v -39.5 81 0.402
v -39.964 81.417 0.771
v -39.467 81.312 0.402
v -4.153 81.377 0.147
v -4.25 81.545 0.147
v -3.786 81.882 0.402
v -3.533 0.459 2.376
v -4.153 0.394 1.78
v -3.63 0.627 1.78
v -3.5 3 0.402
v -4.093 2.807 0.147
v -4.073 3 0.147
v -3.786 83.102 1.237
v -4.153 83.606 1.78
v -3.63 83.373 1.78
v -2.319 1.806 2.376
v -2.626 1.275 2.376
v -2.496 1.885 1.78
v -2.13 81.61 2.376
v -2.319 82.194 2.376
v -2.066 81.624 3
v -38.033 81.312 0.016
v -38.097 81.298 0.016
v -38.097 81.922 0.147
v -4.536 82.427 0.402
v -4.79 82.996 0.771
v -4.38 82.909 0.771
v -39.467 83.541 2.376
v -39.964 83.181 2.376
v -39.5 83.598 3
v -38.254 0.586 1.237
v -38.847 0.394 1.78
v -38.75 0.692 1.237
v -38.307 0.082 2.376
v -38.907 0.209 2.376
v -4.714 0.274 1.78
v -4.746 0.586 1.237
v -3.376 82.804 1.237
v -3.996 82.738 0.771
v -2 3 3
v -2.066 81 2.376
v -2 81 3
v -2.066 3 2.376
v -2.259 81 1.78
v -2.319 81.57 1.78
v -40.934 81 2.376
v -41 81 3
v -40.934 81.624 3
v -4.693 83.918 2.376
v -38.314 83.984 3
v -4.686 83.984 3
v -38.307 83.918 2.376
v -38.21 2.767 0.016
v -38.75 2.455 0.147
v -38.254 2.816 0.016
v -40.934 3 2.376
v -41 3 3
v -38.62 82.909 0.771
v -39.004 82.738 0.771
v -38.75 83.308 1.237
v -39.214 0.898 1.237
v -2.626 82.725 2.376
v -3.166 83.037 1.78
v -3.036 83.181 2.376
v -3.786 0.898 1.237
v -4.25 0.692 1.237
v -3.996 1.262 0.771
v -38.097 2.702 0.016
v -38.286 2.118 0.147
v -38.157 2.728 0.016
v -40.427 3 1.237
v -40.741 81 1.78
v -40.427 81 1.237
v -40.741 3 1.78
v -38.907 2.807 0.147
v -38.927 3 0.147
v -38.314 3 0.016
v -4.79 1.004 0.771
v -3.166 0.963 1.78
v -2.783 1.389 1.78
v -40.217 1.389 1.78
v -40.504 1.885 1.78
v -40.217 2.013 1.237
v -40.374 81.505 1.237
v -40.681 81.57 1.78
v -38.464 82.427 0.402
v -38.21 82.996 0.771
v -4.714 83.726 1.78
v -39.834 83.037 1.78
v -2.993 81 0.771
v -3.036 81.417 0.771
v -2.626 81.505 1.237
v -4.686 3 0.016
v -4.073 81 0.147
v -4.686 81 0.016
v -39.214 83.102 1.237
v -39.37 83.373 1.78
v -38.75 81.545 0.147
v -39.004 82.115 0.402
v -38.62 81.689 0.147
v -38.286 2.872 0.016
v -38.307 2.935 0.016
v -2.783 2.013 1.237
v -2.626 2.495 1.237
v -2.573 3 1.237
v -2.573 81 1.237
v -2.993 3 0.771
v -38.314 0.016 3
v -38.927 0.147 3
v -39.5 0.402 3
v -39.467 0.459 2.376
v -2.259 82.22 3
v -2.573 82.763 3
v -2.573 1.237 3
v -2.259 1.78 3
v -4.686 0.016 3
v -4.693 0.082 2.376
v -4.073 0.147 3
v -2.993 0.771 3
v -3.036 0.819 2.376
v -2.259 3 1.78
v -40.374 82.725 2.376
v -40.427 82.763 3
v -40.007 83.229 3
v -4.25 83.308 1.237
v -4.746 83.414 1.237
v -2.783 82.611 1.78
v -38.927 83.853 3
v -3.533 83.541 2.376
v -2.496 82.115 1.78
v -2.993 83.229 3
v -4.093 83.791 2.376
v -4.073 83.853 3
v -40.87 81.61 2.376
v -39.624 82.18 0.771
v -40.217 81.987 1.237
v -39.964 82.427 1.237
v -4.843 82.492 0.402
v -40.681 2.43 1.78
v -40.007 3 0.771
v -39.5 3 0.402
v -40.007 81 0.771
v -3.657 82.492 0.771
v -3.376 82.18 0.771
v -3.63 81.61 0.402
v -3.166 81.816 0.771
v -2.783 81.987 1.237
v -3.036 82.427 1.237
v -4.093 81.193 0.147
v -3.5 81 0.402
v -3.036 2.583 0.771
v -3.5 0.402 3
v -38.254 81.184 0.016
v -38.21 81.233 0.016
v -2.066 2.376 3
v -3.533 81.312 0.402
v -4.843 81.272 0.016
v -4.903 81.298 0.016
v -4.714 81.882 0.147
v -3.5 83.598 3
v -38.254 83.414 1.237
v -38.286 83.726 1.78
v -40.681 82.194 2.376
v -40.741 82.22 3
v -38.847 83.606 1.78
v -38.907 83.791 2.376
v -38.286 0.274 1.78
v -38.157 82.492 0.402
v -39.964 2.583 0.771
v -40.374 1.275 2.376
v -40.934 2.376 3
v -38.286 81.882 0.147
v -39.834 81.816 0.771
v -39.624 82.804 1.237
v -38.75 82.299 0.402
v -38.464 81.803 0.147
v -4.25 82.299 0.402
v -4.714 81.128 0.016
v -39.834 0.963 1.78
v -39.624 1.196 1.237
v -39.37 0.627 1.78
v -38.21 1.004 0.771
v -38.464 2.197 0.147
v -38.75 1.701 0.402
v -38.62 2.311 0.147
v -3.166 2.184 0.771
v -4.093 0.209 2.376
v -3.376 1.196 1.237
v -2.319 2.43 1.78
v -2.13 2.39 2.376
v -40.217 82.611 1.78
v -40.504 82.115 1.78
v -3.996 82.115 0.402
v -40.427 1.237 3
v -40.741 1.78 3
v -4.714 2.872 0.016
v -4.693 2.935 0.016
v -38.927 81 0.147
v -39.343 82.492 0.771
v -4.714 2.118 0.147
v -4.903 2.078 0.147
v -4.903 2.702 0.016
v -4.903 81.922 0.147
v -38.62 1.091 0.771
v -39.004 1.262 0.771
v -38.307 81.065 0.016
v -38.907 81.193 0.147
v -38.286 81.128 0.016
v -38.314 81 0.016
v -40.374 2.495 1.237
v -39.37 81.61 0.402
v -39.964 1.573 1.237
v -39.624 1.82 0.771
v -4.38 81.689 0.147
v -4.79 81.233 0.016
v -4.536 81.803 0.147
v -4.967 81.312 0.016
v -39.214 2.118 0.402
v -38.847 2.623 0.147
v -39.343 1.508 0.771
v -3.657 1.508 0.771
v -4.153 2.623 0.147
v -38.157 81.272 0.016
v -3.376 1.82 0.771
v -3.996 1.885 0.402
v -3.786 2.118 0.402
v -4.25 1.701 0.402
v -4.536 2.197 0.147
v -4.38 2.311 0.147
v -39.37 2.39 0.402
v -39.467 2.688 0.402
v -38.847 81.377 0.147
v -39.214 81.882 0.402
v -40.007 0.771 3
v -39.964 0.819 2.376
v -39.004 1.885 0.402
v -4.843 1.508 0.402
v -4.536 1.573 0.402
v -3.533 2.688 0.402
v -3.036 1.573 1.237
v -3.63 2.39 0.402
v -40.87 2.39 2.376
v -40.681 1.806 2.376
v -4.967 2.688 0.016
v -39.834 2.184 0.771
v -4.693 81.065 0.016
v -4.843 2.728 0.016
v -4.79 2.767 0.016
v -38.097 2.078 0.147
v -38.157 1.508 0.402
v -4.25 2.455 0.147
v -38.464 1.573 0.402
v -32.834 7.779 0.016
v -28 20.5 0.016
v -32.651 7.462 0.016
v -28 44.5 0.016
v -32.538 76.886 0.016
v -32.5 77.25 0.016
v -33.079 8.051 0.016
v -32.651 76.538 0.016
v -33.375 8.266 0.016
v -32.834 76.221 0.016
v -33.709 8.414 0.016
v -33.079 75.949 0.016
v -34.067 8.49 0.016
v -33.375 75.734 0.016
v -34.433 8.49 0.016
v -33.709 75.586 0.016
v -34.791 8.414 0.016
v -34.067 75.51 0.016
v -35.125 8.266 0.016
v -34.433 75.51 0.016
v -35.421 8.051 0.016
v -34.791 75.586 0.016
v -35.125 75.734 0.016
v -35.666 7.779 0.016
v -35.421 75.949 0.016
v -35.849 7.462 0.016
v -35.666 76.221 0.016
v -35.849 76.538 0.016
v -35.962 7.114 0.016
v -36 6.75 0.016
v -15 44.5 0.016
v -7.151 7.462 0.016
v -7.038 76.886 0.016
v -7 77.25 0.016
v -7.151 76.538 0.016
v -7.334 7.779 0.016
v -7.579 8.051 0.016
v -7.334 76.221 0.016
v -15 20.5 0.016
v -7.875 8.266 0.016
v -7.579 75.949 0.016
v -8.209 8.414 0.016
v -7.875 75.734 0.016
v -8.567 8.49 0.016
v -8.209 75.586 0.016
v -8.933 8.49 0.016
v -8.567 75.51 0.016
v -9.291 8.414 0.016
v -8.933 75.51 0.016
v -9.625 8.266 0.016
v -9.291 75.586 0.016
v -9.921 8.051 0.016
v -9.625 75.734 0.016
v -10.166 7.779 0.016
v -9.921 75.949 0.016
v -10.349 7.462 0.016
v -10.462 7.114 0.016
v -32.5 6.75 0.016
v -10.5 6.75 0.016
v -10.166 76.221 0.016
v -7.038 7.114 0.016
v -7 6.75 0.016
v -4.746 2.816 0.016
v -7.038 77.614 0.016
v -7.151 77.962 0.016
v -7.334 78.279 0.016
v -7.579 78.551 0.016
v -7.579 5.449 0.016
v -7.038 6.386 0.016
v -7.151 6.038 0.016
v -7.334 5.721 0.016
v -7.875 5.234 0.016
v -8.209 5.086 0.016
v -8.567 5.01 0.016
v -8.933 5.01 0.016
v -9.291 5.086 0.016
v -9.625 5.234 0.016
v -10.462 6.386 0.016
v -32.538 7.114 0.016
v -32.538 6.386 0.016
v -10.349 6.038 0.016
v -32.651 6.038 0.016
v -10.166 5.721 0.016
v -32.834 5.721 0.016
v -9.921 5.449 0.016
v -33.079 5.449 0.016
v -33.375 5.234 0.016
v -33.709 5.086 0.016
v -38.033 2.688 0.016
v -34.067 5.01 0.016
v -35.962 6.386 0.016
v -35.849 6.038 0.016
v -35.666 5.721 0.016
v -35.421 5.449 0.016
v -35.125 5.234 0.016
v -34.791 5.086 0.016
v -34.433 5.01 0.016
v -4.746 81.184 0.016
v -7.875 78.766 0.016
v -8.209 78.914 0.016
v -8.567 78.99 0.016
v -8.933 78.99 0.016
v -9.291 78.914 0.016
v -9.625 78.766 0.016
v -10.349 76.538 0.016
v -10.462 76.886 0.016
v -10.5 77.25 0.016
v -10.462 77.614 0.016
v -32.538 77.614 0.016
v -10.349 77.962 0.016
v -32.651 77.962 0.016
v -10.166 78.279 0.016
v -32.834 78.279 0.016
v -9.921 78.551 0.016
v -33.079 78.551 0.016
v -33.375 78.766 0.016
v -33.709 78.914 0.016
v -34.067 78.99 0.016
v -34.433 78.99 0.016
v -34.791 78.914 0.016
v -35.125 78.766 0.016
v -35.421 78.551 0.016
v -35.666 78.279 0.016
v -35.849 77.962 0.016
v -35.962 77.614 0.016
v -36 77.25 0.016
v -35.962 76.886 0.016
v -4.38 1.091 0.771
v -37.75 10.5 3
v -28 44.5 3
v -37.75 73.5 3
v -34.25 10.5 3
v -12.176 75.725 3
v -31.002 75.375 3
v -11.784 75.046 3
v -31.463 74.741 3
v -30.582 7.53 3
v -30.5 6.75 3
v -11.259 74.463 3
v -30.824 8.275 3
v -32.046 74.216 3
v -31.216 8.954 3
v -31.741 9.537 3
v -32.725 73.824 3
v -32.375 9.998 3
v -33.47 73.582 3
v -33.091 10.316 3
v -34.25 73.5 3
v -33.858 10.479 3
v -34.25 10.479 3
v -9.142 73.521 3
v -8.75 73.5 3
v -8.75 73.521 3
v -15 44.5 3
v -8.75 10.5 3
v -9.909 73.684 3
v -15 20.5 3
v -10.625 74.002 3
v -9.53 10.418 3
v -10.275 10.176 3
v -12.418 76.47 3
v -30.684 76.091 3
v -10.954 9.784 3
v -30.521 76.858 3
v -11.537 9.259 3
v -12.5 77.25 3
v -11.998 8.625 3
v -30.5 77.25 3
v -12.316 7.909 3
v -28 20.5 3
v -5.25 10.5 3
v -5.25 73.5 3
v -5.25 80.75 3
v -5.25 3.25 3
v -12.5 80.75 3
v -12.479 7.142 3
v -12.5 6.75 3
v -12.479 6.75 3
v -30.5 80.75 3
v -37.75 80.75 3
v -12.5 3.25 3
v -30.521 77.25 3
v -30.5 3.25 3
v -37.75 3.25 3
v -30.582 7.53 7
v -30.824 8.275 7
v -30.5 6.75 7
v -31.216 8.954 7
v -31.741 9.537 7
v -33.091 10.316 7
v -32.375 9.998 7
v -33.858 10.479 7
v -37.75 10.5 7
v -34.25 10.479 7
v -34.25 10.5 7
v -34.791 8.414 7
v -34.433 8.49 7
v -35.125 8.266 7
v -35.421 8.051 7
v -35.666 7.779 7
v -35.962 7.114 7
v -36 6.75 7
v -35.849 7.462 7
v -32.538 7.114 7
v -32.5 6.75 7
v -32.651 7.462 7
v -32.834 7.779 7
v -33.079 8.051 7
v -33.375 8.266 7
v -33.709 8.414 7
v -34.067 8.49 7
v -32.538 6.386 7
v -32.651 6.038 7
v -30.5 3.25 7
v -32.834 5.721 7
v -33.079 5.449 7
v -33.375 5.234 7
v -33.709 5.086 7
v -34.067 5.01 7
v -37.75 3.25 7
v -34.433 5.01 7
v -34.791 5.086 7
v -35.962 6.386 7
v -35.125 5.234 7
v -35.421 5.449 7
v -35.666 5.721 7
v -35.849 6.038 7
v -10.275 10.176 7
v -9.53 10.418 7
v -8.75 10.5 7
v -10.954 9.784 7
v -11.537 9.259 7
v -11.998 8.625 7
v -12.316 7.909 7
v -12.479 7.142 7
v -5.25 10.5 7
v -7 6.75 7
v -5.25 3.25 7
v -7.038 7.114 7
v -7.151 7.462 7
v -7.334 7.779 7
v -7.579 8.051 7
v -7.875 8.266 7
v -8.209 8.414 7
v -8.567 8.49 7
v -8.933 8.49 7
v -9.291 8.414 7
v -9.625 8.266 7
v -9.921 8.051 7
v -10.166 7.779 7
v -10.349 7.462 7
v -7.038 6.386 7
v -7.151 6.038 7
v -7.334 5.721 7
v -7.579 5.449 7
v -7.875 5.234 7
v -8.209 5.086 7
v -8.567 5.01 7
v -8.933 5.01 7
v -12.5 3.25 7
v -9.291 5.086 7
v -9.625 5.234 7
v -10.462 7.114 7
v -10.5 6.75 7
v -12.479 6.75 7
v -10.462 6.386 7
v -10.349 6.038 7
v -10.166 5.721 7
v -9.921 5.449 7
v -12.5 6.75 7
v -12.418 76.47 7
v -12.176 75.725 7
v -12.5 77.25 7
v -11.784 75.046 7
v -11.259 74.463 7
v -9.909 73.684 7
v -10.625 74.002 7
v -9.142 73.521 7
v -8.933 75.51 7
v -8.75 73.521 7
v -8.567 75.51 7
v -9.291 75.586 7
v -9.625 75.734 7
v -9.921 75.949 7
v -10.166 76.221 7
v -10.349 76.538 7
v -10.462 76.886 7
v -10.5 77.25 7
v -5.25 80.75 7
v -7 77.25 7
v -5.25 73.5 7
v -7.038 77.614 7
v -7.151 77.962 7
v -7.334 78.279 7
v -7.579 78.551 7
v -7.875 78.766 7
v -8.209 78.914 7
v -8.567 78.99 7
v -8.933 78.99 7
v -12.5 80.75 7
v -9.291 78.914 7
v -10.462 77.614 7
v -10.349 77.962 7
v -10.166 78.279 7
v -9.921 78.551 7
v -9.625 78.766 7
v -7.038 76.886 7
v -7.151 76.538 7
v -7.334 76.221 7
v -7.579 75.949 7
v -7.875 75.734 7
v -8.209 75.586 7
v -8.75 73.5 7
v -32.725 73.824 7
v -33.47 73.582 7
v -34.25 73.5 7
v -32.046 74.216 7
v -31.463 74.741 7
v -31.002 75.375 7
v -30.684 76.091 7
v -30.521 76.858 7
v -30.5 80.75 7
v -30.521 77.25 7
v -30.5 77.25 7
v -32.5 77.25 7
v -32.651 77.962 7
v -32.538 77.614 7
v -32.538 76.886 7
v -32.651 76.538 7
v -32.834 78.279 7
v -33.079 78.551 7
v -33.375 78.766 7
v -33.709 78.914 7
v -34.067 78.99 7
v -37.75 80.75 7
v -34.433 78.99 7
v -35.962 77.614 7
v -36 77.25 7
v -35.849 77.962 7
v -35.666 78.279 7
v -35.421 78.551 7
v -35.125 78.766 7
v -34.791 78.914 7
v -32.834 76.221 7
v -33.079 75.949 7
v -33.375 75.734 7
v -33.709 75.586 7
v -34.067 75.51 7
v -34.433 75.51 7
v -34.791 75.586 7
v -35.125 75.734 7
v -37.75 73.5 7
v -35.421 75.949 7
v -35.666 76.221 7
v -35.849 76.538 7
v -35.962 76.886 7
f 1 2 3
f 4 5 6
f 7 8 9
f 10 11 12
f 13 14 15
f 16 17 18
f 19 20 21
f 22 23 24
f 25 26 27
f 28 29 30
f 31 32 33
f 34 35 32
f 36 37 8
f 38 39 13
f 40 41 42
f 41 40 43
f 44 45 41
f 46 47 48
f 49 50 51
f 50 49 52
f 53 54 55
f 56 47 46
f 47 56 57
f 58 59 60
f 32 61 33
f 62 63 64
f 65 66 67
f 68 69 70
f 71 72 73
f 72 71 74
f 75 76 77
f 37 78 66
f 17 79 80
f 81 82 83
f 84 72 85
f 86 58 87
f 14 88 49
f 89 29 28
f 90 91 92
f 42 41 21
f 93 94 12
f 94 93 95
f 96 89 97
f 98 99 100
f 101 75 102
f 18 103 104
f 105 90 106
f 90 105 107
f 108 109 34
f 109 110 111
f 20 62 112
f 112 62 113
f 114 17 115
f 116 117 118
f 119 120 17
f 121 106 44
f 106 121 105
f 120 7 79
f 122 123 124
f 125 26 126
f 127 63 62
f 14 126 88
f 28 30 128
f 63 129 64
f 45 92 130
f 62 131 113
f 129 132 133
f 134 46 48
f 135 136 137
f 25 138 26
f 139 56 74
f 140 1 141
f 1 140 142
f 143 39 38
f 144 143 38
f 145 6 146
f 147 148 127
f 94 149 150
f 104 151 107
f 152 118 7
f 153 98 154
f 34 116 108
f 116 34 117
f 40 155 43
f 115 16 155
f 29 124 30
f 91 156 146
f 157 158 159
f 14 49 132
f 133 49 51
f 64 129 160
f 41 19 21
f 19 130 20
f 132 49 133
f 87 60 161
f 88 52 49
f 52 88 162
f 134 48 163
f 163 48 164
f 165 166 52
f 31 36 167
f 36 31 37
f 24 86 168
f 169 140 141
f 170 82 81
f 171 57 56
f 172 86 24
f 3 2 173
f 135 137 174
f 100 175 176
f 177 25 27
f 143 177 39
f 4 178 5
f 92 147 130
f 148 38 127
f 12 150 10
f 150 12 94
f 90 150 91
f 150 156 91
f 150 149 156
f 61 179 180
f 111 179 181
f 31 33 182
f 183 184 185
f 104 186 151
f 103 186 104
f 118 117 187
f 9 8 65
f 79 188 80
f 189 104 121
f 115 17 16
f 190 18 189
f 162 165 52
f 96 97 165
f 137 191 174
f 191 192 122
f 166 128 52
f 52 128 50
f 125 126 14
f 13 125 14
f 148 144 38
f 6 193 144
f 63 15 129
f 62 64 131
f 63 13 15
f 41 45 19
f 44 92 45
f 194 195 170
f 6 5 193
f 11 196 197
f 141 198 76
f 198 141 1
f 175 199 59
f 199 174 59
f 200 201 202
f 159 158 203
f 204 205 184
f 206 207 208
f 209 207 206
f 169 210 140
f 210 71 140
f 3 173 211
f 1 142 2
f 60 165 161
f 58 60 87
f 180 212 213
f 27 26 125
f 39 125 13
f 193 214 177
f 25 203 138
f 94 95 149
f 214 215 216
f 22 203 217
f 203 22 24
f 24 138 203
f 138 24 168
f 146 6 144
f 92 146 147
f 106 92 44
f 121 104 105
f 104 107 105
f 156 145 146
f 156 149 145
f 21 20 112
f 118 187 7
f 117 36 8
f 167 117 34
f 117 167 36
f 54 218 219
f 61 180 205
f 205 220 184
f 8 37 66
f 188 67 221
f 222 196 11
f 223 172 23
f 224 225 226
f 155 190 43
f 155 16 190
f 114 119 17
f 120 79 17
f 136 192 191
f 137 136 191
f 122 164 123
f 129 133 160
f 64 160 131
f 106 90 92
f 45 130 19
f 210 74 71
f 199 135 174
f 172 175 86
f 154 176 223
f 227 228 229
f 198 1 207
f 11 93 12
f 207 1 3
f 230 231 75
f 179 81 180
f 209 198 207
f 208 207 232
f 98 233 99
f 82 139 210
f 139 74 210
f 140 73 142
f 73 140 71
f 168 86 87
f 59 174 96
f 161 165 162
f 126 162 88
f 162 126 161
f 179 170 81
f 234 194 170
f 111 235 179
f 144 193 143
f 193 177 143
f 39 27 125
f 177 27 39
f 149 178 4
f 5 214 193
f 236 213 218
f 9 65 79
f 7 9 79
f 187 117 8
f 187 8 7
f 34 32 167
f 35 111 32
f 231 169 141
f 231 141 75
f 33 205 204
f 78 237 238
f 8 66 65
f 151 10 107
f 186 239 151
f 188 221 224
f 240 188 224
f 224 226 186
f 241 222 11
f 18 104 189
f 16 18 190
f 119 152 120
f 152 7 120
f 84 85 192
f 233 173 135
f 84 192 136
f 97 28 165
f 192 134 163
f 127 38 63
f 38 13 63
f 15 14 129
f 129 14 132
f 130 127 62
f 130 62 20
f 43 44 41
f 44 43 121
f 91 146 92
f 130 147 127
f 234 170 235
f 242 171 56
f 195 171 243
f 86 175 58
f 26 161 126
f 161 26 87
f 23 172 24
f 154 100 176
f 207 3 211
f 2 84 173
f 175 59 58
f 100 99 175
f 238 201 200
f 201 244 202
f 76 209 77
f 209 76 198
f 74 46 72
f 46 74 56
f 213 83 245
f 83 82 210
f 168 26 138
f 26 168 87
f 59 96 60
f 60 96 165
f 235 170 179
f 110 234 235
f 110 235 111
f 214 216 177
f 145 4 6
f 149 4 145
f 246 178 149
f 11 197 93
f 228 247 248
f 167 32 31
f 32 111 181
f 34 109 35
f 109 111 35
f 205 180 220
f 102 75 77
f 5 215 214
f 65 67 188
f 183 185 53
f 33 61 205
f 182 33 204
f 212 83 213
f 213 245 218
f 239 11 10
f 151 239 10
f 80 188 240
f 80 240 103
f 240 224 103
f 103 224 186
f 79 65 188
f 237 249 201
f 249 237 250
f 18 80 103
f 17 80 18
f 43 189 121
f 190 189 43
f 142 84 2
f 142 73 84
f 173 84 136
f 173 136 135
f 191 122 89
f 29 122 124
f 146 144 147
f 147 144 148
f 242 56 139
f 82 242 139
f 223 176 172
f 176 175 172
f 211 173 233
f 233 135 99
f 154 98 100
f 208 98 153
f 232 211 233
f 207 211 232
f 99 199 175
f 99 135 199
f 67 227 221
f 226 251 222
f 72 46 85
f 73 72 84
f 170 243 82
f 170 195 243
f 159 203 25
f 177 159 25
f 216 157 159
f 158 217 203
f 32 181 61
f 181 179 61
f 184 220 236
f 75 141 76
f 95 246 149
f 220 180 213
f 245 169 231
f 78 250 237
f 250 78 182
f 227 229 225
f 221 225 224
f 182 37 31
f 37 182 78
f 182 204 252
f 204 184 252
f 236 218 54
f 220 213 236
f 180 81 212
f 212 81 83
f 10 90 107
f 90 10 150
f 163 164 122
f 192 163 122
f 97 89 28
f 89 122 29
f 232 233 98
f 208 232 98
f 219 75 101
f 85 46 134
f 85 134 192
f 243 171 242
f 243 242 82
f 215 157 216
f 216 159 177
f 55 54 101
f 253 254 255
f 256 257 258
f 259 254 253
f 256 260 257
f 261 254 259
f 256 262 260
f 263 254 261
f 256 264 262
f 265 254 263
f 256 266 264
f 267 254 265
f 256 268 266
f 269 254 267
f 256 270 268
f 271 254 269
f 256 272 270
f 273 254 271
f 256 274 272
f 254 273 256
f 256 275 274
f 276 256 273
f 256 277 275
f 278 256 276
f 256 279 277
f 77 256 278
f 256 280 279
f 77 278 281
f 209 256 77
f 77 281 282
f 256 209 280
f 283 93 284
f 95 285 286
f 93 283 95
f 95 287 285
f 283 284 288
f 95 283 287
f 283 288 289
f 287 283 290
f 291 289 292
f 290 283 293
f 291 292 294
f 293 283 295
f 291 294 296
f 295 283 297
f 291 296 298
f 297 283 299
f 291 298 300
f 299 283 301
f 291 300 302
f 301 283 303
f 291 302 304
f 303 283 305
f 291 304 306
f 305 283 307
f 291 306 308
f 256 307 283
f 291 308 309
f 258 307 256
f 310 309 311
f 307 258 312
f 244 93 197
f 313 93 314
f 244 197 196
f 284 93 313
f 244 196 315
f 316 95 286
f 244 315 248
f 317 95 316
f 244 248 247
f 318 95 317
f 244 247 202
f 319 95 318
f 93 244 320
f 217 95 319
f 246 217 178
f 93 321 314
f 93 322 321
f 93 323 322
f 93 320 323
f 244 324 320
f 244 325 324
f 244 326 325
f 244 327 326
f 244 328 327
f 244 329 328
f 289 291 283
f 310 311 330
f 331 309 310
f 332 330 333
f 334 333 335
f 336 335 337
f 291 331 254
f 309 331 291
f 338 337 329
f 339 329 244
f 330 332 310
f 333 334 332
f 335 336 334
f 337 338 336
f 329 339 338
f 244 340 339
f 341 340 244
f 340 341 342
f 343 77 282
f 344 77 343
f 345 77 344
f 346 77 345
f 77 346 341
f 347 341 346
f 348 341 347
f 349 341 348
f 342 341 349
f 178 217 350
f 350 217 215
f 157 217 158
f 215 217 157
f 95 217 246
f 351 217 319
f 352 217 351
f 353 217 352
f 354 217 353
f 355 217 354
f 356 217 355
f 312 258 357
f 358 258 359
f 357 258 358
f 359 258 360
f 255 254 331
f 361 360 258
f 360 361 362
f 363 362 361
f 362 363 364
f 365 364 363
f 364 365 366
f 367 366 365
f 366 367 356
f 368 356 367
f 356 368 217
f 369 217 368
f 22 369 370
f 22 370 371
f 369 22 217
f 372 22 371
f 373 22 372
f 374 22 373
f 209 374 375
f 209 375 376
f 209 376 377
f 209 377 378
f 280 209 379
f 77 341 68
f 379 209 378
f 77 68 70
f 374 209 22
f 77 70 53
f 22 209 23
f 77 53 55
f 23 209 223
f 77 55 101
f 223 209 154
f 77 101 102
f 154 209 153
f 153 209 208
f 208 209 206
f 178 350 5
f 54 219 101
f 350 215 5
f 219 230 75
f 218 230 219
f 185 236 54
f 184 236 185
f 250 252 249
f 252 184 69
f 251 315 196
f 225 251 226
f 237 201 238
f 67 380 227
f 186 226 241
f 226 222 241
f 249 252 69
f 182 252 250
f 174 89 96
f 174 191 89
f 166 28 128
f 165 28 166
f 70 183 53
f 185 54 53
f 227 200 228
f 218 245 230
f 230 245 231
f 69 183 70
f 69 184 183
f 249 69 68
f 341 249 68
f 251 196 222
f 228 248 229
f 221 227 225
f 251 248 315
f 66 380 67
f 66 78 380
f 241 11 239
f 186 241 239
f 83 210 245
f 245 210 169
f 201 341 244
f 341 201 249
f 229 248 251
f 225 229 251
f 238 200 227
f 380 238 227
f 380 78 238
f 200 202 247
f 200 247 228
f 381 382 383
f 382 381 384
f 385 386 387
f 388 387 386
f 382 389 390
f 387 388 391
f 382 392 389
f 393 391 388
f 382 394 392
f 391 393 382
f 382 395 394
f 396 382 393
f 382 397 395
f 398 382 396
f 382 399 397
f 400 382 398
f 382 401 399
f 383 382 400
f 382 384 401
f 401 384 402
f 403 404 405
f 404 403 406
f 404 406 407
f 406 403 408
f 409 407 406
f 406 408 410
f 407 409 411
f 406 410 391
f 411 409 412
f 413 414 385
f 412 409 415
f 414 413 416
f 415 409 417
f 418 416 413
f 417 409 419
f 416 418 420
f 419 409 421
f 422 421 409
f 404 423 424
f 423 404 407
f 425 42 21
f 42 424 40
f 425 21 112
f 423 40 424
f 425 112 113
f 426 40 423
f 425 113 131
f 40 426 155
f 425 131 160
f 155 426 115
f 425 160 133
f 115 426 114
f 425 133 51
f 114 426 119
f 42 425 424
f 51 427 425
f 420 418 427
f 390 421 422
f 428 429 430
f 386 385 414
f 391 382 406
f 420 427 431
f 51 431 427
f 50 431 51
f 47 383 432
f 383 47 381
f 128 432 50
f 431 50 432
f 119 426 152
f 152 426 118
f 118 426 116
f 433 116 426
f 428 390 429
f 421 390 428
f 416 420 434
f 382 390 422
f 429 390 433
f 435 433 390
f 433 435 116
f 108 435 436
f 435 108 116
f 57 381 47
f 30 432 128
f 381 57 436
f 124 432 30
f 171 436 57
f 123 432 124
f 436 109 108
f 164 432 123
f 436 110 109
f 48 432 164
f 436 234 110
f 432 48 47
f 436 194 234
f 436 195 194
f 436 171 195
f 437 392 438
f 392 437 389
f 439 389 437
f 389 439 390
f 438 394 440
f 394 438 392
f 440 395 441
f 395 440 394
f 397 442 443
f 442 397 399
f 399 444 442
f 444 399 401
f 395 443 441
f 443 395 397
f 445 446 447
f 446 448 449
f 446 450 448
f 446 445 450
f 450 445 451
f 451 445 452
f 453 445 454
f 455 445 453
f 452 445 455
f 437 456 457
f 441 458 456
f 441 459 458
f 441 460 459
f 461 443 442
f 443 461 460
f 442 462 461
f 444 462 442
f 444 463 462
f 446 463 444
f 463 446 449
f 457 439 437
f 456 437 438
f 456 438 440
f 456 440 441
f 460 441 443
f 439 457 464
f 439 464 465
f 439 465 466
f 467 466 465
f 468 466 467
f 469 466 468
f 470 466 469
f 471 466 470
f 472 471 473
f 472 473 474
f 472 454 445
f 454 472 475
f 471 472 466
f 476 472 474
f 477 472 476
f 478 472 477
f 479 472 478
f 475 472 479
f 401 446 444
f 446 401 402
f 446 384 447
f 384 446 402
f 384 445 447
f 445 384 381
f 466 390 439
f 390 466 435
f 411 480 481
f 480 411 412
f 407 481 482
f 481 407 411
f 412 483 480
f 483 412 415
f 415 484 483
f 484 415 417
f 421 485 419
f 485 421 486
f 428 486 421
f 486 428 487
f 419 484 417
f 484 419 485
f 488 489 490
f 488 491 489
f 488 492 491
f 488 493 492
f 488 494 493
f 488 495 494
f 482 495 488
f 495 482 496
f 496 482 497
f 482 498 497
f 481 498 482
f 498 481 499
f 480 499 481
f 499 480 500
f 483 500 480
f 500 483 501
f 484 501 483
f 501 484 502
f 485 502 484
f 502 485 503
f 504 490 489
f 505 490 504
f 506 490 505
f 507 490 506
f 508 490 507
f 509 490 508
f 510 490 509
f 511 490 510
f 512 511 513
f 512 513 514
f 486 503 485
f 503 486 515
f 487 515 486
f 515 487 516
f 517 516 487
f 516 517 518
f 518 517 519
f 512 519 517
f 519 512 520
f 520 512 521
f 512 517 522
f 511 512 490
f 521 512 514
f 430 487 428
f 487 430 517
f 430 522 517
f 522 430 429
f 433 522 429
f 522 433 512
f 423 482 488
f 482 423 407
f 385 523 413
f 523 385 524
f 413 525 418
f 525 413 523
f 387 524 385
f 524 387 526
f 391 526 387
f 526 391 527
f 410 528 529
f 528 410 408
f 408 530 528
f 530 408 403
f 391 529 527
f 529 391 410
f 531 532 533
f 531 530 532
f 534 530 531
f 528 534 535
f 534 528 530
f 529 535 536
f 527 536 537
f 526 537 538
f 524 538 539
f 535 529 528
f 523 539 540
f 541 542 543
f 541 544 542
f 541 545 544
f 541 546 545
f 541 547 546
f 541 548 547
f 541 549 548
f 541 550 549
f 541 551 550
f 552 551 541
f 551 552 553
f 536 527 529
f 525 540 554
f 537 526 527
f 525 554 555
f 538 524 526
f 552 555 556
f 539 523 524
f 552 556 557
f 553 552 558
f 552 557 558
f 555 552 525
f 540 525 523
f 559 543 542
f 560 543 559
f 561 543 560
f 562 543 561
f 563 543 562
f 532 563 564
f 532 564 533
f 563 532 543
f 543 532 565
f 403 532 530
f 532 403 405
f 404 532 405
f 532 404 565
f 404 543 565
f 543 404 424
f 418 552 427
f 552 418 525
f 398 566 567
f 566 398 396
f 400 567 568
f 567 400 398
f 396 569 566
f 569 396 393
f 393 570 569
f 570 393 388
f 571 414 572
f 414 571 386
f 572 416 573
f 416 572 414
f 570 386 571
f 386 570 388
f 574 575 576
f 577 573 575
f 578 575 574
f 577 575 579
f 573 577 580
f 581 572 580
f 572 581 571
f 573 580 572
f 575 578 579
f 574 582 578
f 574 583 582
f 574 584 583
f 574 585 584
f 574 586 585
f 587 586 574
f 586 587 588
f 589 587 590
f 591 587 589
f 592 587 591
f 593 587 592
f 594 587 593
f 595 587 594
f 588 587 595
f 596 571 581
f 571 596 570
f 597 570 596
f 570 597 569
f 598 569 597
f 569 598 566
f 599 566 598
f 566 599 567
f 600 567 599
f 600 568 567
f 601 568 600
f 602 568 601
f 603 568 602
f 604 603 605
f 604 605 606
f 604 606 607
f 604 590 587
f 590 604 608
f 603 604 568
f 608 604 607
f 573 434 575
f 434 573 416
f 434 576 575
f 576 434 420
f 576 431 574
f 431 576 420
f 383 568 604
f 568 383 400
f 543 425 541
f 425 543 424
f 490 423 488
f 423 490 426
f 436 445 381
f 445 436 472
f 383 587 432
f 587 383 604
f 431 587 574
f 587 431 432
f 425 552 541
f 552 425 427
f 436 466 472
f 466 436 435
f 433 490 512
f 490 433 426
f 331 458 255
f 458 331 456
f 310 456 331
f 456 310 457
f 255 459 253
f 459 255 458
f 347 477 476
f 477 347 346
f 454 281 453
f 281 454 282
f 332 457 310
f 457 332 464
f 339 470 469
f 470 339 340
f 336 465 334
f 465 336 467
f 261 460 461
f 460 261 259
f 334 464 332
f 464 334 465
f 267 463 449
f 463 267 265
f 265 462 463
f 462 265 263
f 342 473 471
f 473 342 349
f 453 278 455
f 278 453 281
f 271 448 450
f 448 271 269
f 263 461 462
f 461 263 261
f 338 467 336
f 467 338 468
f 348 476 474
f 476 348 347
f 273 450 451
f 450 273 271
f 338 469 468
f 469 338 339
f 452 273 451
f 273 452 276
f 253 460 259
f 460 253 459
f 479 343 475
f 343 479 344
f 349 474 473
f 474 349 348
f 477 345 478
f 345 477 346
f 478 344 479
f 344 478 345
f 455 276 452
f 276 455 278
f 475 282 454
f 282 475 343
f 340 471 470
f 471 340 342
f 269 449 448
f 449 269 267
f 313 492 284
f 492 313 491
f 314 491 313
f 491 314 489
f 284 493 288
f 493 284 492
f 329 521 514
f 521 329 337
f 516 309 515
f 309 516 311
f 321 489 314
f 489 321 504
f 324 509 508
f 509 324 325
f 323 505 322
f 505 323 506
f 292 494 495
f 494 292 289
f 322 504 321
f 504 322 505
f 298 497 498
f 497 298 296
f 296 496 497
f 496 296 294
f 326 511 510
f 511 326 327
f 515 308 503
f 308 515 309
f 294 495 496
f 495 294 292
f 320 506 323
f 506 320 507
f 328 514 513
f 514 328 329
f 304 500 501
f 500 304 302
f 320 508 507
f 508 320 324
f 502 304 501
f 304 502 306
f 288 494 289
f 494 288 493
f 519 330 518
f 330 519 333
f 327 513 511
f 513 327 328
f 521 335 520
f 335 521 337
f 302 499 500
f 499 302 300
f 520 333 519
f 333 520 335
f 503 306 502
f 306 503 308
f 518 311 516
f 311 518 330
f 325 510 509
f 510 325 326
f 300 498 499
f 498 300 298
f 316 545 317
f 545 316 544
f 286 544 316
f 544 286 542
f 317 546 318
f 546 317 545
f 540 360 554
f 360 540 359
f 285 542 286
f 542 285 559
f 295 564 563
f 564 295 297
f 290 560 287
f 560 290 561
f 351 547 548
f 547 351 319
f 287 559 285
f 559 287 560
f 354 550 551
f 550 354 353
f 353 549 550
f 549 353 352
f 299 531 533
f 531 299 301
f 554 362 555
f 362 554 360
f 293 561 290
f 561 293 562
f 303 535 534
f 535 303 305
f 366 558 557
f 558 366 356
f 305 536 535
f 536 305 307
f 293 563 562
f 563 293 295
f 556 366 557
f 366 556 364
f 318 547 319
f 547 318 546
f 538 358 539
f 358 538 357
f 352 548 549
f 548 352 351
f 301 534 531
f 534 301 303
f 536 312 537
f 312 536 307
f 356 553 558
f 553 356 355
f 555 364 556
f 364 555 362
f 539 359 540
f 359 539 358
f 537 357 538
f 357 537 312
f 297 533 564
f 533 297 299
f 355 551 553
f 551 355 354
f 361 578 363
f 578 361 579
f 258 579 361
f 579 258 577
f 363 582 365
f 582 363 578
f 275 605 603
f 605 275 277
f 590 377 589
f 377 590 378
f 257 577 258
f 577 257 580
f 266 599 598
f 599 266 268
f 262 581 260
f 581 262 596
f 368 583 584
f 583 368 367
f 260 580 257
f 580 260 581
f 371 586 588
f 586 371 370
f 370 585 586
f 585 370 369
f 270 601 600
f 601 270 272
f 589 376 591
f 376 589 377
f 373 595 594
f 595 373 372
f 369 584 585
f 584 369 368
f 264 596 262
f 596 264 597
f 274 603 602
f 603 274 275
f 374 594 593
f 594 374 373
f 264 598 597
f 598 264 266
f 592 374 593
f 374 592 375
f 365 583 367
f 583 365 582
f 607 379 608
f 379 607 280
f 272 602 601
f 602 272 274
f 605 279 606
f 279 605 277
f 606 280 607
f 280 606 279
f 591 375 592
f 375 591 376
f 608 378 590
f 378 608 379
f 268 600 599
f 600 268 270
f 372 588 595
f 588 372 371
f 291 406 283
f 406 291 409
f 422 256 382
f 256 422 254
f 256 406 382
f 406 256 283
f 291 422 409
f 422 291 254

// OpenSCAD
//Procedural Project Box Screws Remix
//CudaTox, 2017
//Corrected issues when thickness is changed screw columns are not located correctly.
//Corrected issue whtn thickness is greater than 2 and lip_tol is used created offset in screw posts in lid.
//Added options for lid reinforcment and lid screw stud length
//Cleaned up code buy calculating global variables to use in place of formulas.
//Ron Shenk 2019
//Revision 1
//Added variables to allow generating each element seperate or together

//Maker2741 - 8/2019
//Revision 2
//Added windows, holes options in lid
//Added external mounting flange option
//Added internal mounting hole option
//Added pad reinforcement around mounting hole option
//Converted ic stud mount to a center/offset option (same as all mounting holes, windows, etc.
//Offset of 0,0 will mount the object centered on the box.  Then offset in x and/or y to move position.


////////////////////////////////////////////////////////////////////////
//Options list - Change these:
////////////////////////////////////////////////////////////////////////

//These must be true or false:
generate_box = false;            // true generates box false skips generating the box
generate_lid = true;            // true generates lid, false skips generating the lid

generate_window_1 = true;       // true generates a square window for the display screen, false means solid lid
generate_window_2 = false;       // true generates a square window, false means solid lid
generate_window_3 = true;       // true generates a square window, false means no USB hole

generate_hole_1 = false;         // true generates a round hole, false means solid lid
generate_hole_2 = false;        // true generates a round hole, false means solid lid
generate_hole_3 = false;        // true generates a round hole, false means solid lid
generate_hole_4 = false;        // true generates a round hole, false means solid lid

generate_hole_5 = true;         // true generates a round hole on end of box for cable gland/exit, false means solid box
generate_RSrelief = true;       // true generates relief on the ic studs so that the RS converter can fit between them
//generate screen_lip = true;

use_ic_studs = false;           //true generates ic studs in box, false means flat bottom
use_internal_mount = false;      //true generates holes in the bottom of the box for screws
use_external_mount = false;      //true generates a flange with holes outside the box (on Y axis)
use_mount_pads = true;         //true generates a pad around the mount holes, false means no pad


//Box Parameters in mm
inside_width = 33;              //x direction
inside_length = 78;            //y direction
inside_height = 23.5;             //z direction
thickness = 3;                  //Wall thickness
radius =3;              		//Corner radius. Should not be larger than thickness
screw_dia = 3;                  //Diameter of the screw you intend to use
screw_loose_dia = 3.5;

//RS485 converter relief
RSrelief_x = 23;
RSrelief_y = 8;

RSrelief_offset_x = -RSrelief_x/2;
RSrelief_offset_y = -(RSrelief_y+3);

//Lid Window and Hole Dimensions in mm
window_1_x = 13;                //x direction
window_1_y = 24;                //y direction

window_2_x = 18;
window_2_y = 12;

hole_1_dia = 10;
hole_2_dia = 10;
hole_3_dia = 15;
hole_4_dia = 15;

//Box Window and Hole Dimensions in mm

hole_5_dia = 16.5; // Cable gland hole

window_3_x = 18; // USB hole
window_3_y = 15;

//Winow and Hole Locations - (0,0) = centered on lid, otherwise offset in mm
window_1_offset_x = 0;          //x direction
window_1_offset_y = -9.5;         //y direction

window_2_offset_x = 0;
window_2_offset_y = -36;


hole_1_offset_x = 10;
hole_1_offset_y = -15;

hole_2_offset_x = -10;
hole_2_offset_y = -15;

hole_3_offset_x = 15;
hole_3_offset_y = -30;

hole_4_offset_x = -15;
hole_4_offset_y = -30;

//Window and Hole location on box - (0,0) = centered on side, otherwise offset in mm

hole_5_offset_x = 0;
hole_5_offset_y = -0.5;

window_3_offset_x = -48;
window_3_offset_y = -1;


//Additional lid parameters
extra_lid_thickness = 0;        //Extra lid thickness above thickness. 
                                //You may want to tweak this to account for large chamfer radius.
lip_tol = .5;					//this tolerence helps the lid fit
lid_stud_height = 4;			//Length of studs on lid
lid_lip_height = 0;    			//Lid locating / reinforcement lip height
lid_lip_width =0;				//Width of lid locating / reinforcement lip
screen_lip_height = 1;
screen_lip_width = 1;

//Additional IC stud parameters 1
ic1_stud_height = 7;             //IC stud height
ic1_stud_id = 2.5;                 //Diameter of screw needed
ic1_stud_od = ic1_stud_id*2.5;    //you can set this manually to a fixed value in place of the formula
ic1_stud_multiplier = .9;       //decreases stud id when using threaded fastners so they have purchase
ic1_stud_x = 15;             //Witdth between centers of ic studs-can be 0 for only 2 studs
ic1_stud_y = 32;            //Length between centers of ic studs-can be 0 for only 2 studs
ic1_stud_offset_x = 0;           //IC stud offset x position, 0 = centered
ic1_stud_offset_y = 4;            //IC stud offset y position, 0 = centered

//Additional IC stud parameters 2
ic2_stud_height = 19;             //IC stud height
ic2_stud_id = 2.5;                 //Diameter of screw needed
ic2_stud_od = ic2_stud_id*2.5;    //you can set this manually to a fixed value in place of the formula
ic2_stud_multiplier = .9;       //decreases stud id when using threaded fastners so they have purchase
ic2_stud_x = 26.5;             //Witdth between centers of ic studs-can be 0 for only 2 studs
ic2_stud_y = 53.5;            //Length between centers of ic studs-can be 0 for only 2 studs
ic2_stud_offset_x = 0;           //IC stud offset x position, 0 = centered
ic2_stud_offset_y = 0;            //IC stud offset y position, 0 = centered


//Internal mounting hole parameters
internal_mount_x = 40;          //Width of the bolt hole pattern - can be 0 for only 2 holes
internal_mount_y = 60;          //Length of the bolt hole pattern - can be 0 for only 2 holes
internal_mount_offset_x = 0;    //Offset of the hole pattern from center of the box 0 = centered
internal_mount_offset_y = 0;    //Offset of the hole pattern from center of the box 0 = centered
internal_mount_hole_dia = 4;    //Diameter of the screw hole


//External mounting parameters
external_flange_width = 15;     //Width of the mounting flange - applied to y direction
external_mount_hole_dia = 4;     //Mounting hole diameter
external_mount_x = 30;          //Center to center distance of ext. mounting holes - can be 0 for only 2 holes
external_mount_offset_x = 0;    //Offset hole pattern from x-center of the box, 0 = centered
   //For simplicity, the external holes are automatically spaced on the Y centerline of each flange
  
  
//Reinforcement pad parameters (apply to all mounting holes)
reinforce_thickness = 3;        //Thickness of the pad
reinforce_diameter = 10;        //Diameter of the pad, typically several mm more than the hole



//Board Slot Parameters         
board_thickness = 2.1;            //Thickness of circuit board inserted in the slot.  May want to apply a slight overage for ease of insertion / removal.
x_slot_number = 0;               //Creates equally spaced slots along the x walls, 0 = no slots
y_slot_number = 0;                //Creates equally spaced slots along the y walls, 0 = no slots




//////////////////////////////////////////////////////////////////////////////////////
//Do not modify values below this line
//////////////////////////////////////////////////////////////////////////////////////

// Computation of variables used in box creation do not modify values below this line
od = screw_dia * 2.5;
outside_width = inside_width + (thickness * 2);
outside_length = inside_length + (thickness * 2);
outside_height = inside_height + (thickness * 2);
box_stud_height = inside_height - lid_stud_height;
column_offset = (od/2)+thickness;
column_radius = od/2;
lid_startpos = (outside_width*-1)-2;
lid_lengthoffset = inside_length - column_radius + thickness;
lid_widthoffset = inside_width - column_radius + thickness;
ic1_stud_real_id = ic1_stud_id * ic1_stud_multiplier;
ic2_stud_real_id = ic2_stud_id * ic2_stud_multiplier;

module box_ic1_stud(height,id,od){
    difference(){
        cylinder(d=od, h=height, $fn=100);
        cylinder(d=id * ic1_stud_multiplier, h=height, $fn=100);
    }
}

module box_ic2_stud(height,id,od){
    difference(){
        cylinder(d=od, h=height, $fn=100);
        cylinder(d=id * ic2_stud_multiplier, h=height, $fn=100);
    }
}

module box_screw(id, od, height){
    difference(){
        union(){
            cylinder(d=od, h=height, $fs=0.2);
            translate([-(od/2), -(od/2), 0])
                cube([(od/2),od,height], false);
            translate([-od/2, -(od/2), 0])
                cube([od,(od/2),height], false);
        }
        cylinder(d=id, h=height, $fn=6);
    }
}

module rounded_box(x,y,z,r){
    translate([r,r,r])
    minkowski(){
        cube([x-r*2,y-r*2,z-r*2]);
        sphere(r=r, $fs=0.1);
    }
}

module main_box(){
    
    
    difference()
    {
        union(){//cube([outside_width, outside_length, outside_height]);
        difference(){
            //external cube
            rounded_box(outside_width, outside_length, outside_height, radius);
            translate([0,0,inside_height + thickness])
            cube([outside_width, outside_length, outside_height]);
            //minus internal cube
            translate([thickness, thickness, thickness])
            cube([inside_width, inside_length, inside_height + thickness]);
            if (generate_hole_5){ 
        rotate([90,0,0]) 
        translate([((outside_width/2)+hole_5_offset_x),((outside_height/2)+hole_5_offset_y),-(inside_length+10)]) 
    cylinder(h = 10, d = hole_5_dia);
        }
        if (generate_window_3){ 
            rotate([90,0,180])
            translate([((outside_width/2)+window_3_offset_x),((outside_height/2)+window_3_offset_y),0]) 
            cube([window_3_x,window_3_y,10]);
           }
           
        
        
   }
        
                      
               
            if (use_external_mount){
                   
                   if (use_mount_pads){
                       
             //external pads
            translate([((outside_width/2) + (external_mount_x/2) + external_mount_offset_x),((outside_length) + (external_flange_width/2)),thickness]) 
            cylinder(h = reinforce_thickness, d = reinforce_diameter);
                       
            translate([((outside_width/2) - (external_mount_x/2) + external_mount_offset_x),((outside_length) + (external_flange_width/2)),thickness])
            cylinder(h = reinforce_thickness, d = reinforce_diameter);
            
            translate([((outside_width/2) + (external_mount_x/2) + external_mount_offset_x),(-external_flange_width/2),thickness]) 
            cylinder(h = reinforce_thickness, d = reinforce_diameter);
                       
            translate([((outside_width/2) - (external_mount_x/2) + external_mount_offset_x),(-external_flange_width/2),thickness]) 
            cylinder(h = reinforce_thickness, d = reinforce_diameter);    
                   }
            //flange       
            corner_radius = external_flange_width / 4;
            hull(){
            translate([corner_radius, (-external_flange_width + corner_radius), 0])
            cylinder(h = thickness, r = corner_radius);
            translate([outside_width - corner_radius, (-external_flange_width + corner_radius), 0])
            cylinder(h = thickness, r = corner_radius);
            translate([outside_width - corner_radius, (outside_length + external_flange_width - corner_radius), 0])
            cylinder(h = thickness, r = corner_radius);
            translate([corner_radius, (outside_length + external_flange_width - corner_radius), 0])
            cylinder(h = thickness, r = corner_radius);
            }
        }
            if (use_internal_mount){
                    if (use_mount_pads){ 
              
            //internal pads
            translate([((outside_width/2) + (internal_mount_x/2) + internal_mount_offset_x),((outside_length/2) + (internal_mount_y/2) + internal_mount_offset_y),thickness]) 
            cylinder(h = reinforce_thickness, d = reinforce_diameter);
                
            translate([((outside_width/2) - (internal_mount_x/2) + internal_mount_offset_x),((outside_length/2) + (internal_mount_y/2) + internal_mount_offset_y),thickness])
            cylinder(h = reinforce_thickness, d = reinforce_diameter);
            
            translate([((outside_width/2) + (internal_mount_x/2) + internal_mount_offset_x),((outside_length/2) - (internal_mount_y/2) + internal_mount_offset_y),thickness]) 
            cylinder(h = reinforce_thickness, d = reinforce_diameter);
                
            translate([((outside_width/2) - (internal_mount_x/2) + internal_mount_offset_x),((outside_length/2) - (internal_mount_y/2) + internal_mount_offset_y),thickness]) 
            cylinder(h = reinforce_thickness, d = reinforce_diameter);
        }
    }
    
   
        
    y_slot_space = (outside_length / (y_slot_number+1));
        
     for (i = [1:1:y_slot_number]){
        //left slots    
        difference(){
        translate([thickness + inside_width, (y_slot_space * i), ((inside_height - lid_stud_height) / 2)+thickness])
        cube([thickness * 2, ((thickness * 2) + board_thickness), inside_height-lid_stud_height], center = true);
        
       translate([thickness + inside_width, (y_slot_space * i), ((inside_height - lid_stud_height) / 2) + thickness])    
       cube([(thickness * 2.1), board_thickness, ((inside_height)+5)], center = true);
        }
        
        //right slots
        difference(){
        translate([thickness, (y_slot_space * i), ((inside_height - lid_stud_height) / 2)+thickness])
        cube([thickness * 2, ((thickness * 2) + board_thickness), inside_height-lid_stud_height], center = true);
        
       translate([thickness, (y_slot_space * i), ((inside_height - lid_stud_height) / 2) + thickness])    
      cube([(thickness * 2.1), board_thickness, ((inside_height)+5)], center = true);
        }
     }
    
     
    x_slot_space = ((outside_width / (x_slot_number+1)));
        
      for (i = [1:1:x_slot_number]){
        //bottom slots    
        difference(){
        translate([(x_slot_space * i), thickness, ((inside_height - lid_stud_height) / 2)+thickness])
        cube([((thickness *2) + board_thickness), thickness * 2, inside_height-lid_stud_height], center = true);
        
        translate([(x_slot_space * i), thickness, ((inside_height - lid_stud_height) / 2) + thickness])    
        cube([board_thickness, (thickness * 2.1),  ((inside_height)+5)], center = true);
        }
        
        //top slots
        difference(){
        translate([(x_slot_space * i), inside_length + thickness, ((inside_height - lid_stud_height) / 2)+thickness])
        cube([((thickness *2) + board_thickness), thickness * 2, inside_height-lid_stud_height], center = true);
        
       translate([(x_slot_space * i), inside_length + thickness, ((inside_height - lid_stud_height) / 2) + thickness])    
        cube([board_thickness, (thickness * 2.1),  ((inside_height)+5)], center = true);
        }
    }
    
    

    
}
        
            if (use_internal_mount){
            //internal holes
            translate([((outside_width/2) + (internal_mount_x/2) + internal_mount_offset_x),((outside_length/2) + (internal_mount_y/2) + internal_mount_offset_y),-5]) 
            cylinder(h = 50, d = internal_mount_hole_dia);
            
            translate([((outside_width/2) - (internal_mount_x/2) + internal_mount_offset_x),((outside_length/2) + (internal_mount_y/2) + internal_mount_offset_y),-5])
            cylinder(h = 50, d = internal_mount_hole_dia);
            
            translate([((outside_width/2) + (internal_mount_x/2) + internal_mount_offset_x),((outside_length/2) - (internal_mount_y/2) + internal_mount_offset_y),-5]) 
            cylinder(h = 50, d = internal_mount_hole_dia);

            translate([((outside_width/2) - (internal_mount_x/2) + internal_mount_offset_x),((outside_length/2) - (internal_mount_y/2) + internal_mount_offset_y),-5]) 
            cylinder(h = 50, d = internal_mount_hole_dia);
           
       }
       
            if (use_external_mount){
            //external holes
            translate([((outside_width/2) + (external_mount_x/2) + external_mount_offset_x),((outside_length) + (external_flange_width/2)),-5]) 
            cylinder(h = 50, d = external_mount_hole_dia);
                       
            translate([((outside_width/2) - (external_mount_x/2) + external_mount_offset_x),((outside_length) + (external_flange_width/2)),-5])
            cylinder(h = 50, d = external_mount_hole_dia);
            
            translate([((outside_width/2) + (external_mount_x/2) + external_mount_offset_x),(-external_flange_width/2),-5]) 
            cylinder(h = 50, d = external_mount_hole_dia);
                       
            translate([((outside_width/2) - (external_mount_x/2) + external_mount_offset_x),(-external_flange_width/2),-5]) 
            cylinder(h = 50, d = external_mount_hole_dia); 
       }
       
}
    

    od = screw_dia * 2.5;
    

    //translate(0,0,0)
	translate([column_offset,column_offset, thickness])
        box_screw(screw_dia, od, box_stud_height);

    //translate(0,0,0)
	translate([outside_width - column_offset, column_offset, thickness])
        rotate([0,0,90])
            box_screw(screw_dia, od, box_stud_height);
    difference(){
    //translate(0,0,0)
	translate([outside_width - column_offset, outside_length - column_offset, thickness])
        rotate([0,0,180])
            box_screw(screw_dia, od, box_stud_height);
               if (generate_RSrelief){ 
            rotate([90,0,180])
            translate([(-(outside_width/2)+RSrelief_offset_x),((outside_height/2)+RSrelief_offset_y),(outside_length/2)+(ic2_stud_y/2)-2.5]) 
            cube([RSrelief_x,RSrelief_y,20]);
           }
           
       }
       difference(){
    //translate(0,0,0)
	translate([column_offset, outside_length - column_offset, thickness])
        rotate([0,0,270])
            box_screw(screw_dia, od, box_stud_height);
                         if (generate_RSrelief){ 
            rotate([90,0,180])
            translate([(-(outside_width/2)+RSrelief_offset_x),((outside_height/2)+RSrelief_offset_y),(outside_length/2)+(ic2_stud_y/2)-2.5]) 
            cube([RSrelief_x,RSrelief_y,20]);
           }
           
       }
           };

           
    

    if (use_ic_studs)
    {
        
        //IC Studs 1
            translate([((outside_width/2) + (ic1_stud_x/2) + ic1_stud_offset_x),((outside_length/2) + (ic1_stud_y/2) + ic1_stud_offset_y), 0]) 
            box_ic1_stud(ic1_stud_height, ic1_stud_real_id , ic1_stud_od); 
            
            translate([((outside_width/2) - (ic1_stud_x/2) + ic1_stud_offset_x),((outside_length/2) + (ic1_stud_y/2) + ic1_stud_offset_y), 0])
            box_ic1_stud(ic1_stud_height, ic1_stud_real_id , ic1_stud_od); 
            
            translate([((outside_width/2) + (ic1_stud_x/2) + ic1_stud_offset_x),((outside_length/2) - (ic1_stud_y/2) + ic1_stud_offset_y), 0]) 
            box_ic1_stud(ic1_stud_height, ic1_stud_real_id , ic1_stud_od); 

            translate([((outside_width/2) - (ic1_stud_x/2) + ic1_stud_offset_x),((outside_length/2) - (ic1_stud_y/2) + ic1_stud_offset_y), 0]) 
            box_ic1_stud(ic1_stud_height, ic1_stud_real_id , ic1_stud_od); 
        
    //IC Studs 2
        
        difference(){
            translate([((outside_width/2) + (ic2_stud_x/2) + ic2_stud_offset_x),((outside_length/2) + (ic2_stud_y/2) + ic2_stud_offset_y), 0]) 
            box_ic2_stud(ic2_stud_height, ic2_stud_real_id , ic2_stud_od); 
            if (generate_RSrelief){ 
            rotate([90,0,180])
            translate([(-(outside_width/2)+RSrelief_offset_x),((outside_height/2)+RSrelief_offset_y),(outside_length/2)+(ic2_stud_y/2)-2.5]) 
            cube([RSrelief_x,RSrelief_y,10]);
           }
        }
            difference(){
            translate([((outside_width/2) - (ic2_stud_x/2) + ic2_stud_offset_x),((outside_length/2) + (ic2_stud_y/2) + ic2_stud_offset_y), 0])
            box_ic2_stud(ic2_stud_height, ic2_stud_real_id , ic2_stud_od); 
        if (generate_RSrelief){ 
            rotate([90,0,180])
            translate([(-(outside_width/2)+RSrelief_offset_x),((outside_height/2)+RSrelief_offset_y),(outside_length/2)+(ic2_stud_y/2)-2.5]) 
            cube([RSrelief_x,RSrelief_y,10]);
           }
        }
            
            translate([((outside_width/2) + (ic2_stud_x/2) + ic2_stud_offset_x),((outside_length/2) - (ic2_stud_y/2) + ic2_stud_offset_y), 0]) 
            box_ic2_stud(ic2_stud_height, ic2_stud_real_id , ic2_stud_od); 

            translate([((outside_width/2) - (ic2_stud_x/2) + ic2_stud_offset_x),((outside_length/2) - (ic2_stud_y/2) + ic2_stud_offset_y), 0]) 
            box_ic2_stud(ic2_stud_height, ic2_stud_real_id , ic2_stud_od); 
        
               
    }
    


module lid(){
    difference()
        {
        union()
        {   
            //Lid.
            difference(){
                rounded_box(outside_width, outside_length, thickness * 4, radius);
                //move slightly to the right to get rid of abandoned surfaces
                translate([-1,0, thickness + extra_lid_thickness]) 
                    //increased width to remove abandoned surfaces
                    cube([outside_width+2, outside_length, inside_height + thickness * 4]);  
            }
            //Lip
            lip_width = inside_width - lip_tol;
            lip_length = inside_length - lip_tol;
            translate([(outside_width - lip_width)/2,(outside_length - lip_length)/2, thickness *.99])
                difference(){
                    cube([lip_width, lip_length, lid_lip_height]);
                    translate([lid_lip_width, lid_lip_width, 0])
                        //added extra z to ensure no remaining surfaces
                        cube([lip_width-(lid_lip_width*2), lip_length-(lid_lip_width*2), lid_lip_height+1]);  
                         
            }
        
            //stud columns
            intersection(){
                union(){
                translate([column_offset, column_offset, thickness])
                    box_screw(screw_dia, od, lid_stud_height);
                translate([lid_widthoffset, column_offset, thickness])
                    rotate([0,0,90])
                        box_screw(screw_dia, od, lid_stud_height);
                translate([lid_widthoffset, lid_lengthoffset, thickness])
                    rotate([0,0,180])
                        box_screw(screw_dia, od, lid_stud_height);
                translate([column_offset, lid_lengthoffset, thickness])
                    rotate([0,0,270])
                        box_screw(screw_dia, od, lid_stud_height);
                }
                translate([thickness + (lip_tol/2), thickness + (lip_tol/2), 0])
                cube([lip_width , lip_length, 10]);
            }

        }

        //windows, Holes and Screws
        union()
        {
            translate([column_offset, column_offset, thickness])
                cylinder(h = thickness + lid_stud_height + 2, d = screw_loose_dia, center=true, $fs=0.2);
            translate([lid_widthoffset, column_offset, thickness])
                cylinder(h = thickness + lid_stud_height + 2, d = screw_loose_dia, center=true, $fs=0.2);
            translate([lid_widthoffset, lid_lengthoffset, thickness])
                cylinder(h = thickness + lid_stud_height + 2, d = screw_loose_dia, center=true, $fs=0.2);
            translate([column_offset, lid_lengthoffset, thickness])
                cylinder(h = thickness + lid_stud_height + 2, d = screw_loose_dia, center=true, $fs=0.2);
 
           if (generate_window_1){ 
            translate([(((outside_width-window_1_x)/2)+window_1_offset_x),(((outside_length-window_1_y)/2)+window_1_offset_y),-5]) 
            cube([window_1_x,window_1_y,50]);
           }
           if (generate_window_2){ 
            translate([(((outside_width-window_2_x)/2)+window_2_offset_x),(((outside_length-window_2_y)/2)+window_2_offset_y),-5]) 
            cube([window_2_x,window_2_y,50]);
           }
           
            if (generate_hole_1){ 
            translate([((outside_width/2)+hole_1_offset_x),((outside_length/2)+hole_1_offset_y),-5]) 
            cylinder(h = 50, d = hole_1_dia);
           }
           if (generate_hole_2){ 
            translate([((outside_width/2)+hole_2_offset_x),((outside_length/2)+hole_2_offset_y),-5]) 
            cylinder(h = 50, d = hole_2_dia);
           }
           if (generate_hole_3){ 
            translate([((outside_width/2)+hole_3_offset_x),((outside_length/2)+hole_3_offset_y),-5]) 
            cylinder(h = 50, d = hole_3_dia);
           }
           if (generate_hole_4){
            translate([((outside_width/2)+hole_4_offset_x),((outside_length/2)+hole_4_offset_y),-5]) 
            cylinder(h = 50, d = hole_4_dia);
           }
           
           
        }

    }
}

if (generate_box)
{
    main_box();
}
if (generate_lid) 
{    
    translate([lid_startpos,0,0])
    lid();
}    
